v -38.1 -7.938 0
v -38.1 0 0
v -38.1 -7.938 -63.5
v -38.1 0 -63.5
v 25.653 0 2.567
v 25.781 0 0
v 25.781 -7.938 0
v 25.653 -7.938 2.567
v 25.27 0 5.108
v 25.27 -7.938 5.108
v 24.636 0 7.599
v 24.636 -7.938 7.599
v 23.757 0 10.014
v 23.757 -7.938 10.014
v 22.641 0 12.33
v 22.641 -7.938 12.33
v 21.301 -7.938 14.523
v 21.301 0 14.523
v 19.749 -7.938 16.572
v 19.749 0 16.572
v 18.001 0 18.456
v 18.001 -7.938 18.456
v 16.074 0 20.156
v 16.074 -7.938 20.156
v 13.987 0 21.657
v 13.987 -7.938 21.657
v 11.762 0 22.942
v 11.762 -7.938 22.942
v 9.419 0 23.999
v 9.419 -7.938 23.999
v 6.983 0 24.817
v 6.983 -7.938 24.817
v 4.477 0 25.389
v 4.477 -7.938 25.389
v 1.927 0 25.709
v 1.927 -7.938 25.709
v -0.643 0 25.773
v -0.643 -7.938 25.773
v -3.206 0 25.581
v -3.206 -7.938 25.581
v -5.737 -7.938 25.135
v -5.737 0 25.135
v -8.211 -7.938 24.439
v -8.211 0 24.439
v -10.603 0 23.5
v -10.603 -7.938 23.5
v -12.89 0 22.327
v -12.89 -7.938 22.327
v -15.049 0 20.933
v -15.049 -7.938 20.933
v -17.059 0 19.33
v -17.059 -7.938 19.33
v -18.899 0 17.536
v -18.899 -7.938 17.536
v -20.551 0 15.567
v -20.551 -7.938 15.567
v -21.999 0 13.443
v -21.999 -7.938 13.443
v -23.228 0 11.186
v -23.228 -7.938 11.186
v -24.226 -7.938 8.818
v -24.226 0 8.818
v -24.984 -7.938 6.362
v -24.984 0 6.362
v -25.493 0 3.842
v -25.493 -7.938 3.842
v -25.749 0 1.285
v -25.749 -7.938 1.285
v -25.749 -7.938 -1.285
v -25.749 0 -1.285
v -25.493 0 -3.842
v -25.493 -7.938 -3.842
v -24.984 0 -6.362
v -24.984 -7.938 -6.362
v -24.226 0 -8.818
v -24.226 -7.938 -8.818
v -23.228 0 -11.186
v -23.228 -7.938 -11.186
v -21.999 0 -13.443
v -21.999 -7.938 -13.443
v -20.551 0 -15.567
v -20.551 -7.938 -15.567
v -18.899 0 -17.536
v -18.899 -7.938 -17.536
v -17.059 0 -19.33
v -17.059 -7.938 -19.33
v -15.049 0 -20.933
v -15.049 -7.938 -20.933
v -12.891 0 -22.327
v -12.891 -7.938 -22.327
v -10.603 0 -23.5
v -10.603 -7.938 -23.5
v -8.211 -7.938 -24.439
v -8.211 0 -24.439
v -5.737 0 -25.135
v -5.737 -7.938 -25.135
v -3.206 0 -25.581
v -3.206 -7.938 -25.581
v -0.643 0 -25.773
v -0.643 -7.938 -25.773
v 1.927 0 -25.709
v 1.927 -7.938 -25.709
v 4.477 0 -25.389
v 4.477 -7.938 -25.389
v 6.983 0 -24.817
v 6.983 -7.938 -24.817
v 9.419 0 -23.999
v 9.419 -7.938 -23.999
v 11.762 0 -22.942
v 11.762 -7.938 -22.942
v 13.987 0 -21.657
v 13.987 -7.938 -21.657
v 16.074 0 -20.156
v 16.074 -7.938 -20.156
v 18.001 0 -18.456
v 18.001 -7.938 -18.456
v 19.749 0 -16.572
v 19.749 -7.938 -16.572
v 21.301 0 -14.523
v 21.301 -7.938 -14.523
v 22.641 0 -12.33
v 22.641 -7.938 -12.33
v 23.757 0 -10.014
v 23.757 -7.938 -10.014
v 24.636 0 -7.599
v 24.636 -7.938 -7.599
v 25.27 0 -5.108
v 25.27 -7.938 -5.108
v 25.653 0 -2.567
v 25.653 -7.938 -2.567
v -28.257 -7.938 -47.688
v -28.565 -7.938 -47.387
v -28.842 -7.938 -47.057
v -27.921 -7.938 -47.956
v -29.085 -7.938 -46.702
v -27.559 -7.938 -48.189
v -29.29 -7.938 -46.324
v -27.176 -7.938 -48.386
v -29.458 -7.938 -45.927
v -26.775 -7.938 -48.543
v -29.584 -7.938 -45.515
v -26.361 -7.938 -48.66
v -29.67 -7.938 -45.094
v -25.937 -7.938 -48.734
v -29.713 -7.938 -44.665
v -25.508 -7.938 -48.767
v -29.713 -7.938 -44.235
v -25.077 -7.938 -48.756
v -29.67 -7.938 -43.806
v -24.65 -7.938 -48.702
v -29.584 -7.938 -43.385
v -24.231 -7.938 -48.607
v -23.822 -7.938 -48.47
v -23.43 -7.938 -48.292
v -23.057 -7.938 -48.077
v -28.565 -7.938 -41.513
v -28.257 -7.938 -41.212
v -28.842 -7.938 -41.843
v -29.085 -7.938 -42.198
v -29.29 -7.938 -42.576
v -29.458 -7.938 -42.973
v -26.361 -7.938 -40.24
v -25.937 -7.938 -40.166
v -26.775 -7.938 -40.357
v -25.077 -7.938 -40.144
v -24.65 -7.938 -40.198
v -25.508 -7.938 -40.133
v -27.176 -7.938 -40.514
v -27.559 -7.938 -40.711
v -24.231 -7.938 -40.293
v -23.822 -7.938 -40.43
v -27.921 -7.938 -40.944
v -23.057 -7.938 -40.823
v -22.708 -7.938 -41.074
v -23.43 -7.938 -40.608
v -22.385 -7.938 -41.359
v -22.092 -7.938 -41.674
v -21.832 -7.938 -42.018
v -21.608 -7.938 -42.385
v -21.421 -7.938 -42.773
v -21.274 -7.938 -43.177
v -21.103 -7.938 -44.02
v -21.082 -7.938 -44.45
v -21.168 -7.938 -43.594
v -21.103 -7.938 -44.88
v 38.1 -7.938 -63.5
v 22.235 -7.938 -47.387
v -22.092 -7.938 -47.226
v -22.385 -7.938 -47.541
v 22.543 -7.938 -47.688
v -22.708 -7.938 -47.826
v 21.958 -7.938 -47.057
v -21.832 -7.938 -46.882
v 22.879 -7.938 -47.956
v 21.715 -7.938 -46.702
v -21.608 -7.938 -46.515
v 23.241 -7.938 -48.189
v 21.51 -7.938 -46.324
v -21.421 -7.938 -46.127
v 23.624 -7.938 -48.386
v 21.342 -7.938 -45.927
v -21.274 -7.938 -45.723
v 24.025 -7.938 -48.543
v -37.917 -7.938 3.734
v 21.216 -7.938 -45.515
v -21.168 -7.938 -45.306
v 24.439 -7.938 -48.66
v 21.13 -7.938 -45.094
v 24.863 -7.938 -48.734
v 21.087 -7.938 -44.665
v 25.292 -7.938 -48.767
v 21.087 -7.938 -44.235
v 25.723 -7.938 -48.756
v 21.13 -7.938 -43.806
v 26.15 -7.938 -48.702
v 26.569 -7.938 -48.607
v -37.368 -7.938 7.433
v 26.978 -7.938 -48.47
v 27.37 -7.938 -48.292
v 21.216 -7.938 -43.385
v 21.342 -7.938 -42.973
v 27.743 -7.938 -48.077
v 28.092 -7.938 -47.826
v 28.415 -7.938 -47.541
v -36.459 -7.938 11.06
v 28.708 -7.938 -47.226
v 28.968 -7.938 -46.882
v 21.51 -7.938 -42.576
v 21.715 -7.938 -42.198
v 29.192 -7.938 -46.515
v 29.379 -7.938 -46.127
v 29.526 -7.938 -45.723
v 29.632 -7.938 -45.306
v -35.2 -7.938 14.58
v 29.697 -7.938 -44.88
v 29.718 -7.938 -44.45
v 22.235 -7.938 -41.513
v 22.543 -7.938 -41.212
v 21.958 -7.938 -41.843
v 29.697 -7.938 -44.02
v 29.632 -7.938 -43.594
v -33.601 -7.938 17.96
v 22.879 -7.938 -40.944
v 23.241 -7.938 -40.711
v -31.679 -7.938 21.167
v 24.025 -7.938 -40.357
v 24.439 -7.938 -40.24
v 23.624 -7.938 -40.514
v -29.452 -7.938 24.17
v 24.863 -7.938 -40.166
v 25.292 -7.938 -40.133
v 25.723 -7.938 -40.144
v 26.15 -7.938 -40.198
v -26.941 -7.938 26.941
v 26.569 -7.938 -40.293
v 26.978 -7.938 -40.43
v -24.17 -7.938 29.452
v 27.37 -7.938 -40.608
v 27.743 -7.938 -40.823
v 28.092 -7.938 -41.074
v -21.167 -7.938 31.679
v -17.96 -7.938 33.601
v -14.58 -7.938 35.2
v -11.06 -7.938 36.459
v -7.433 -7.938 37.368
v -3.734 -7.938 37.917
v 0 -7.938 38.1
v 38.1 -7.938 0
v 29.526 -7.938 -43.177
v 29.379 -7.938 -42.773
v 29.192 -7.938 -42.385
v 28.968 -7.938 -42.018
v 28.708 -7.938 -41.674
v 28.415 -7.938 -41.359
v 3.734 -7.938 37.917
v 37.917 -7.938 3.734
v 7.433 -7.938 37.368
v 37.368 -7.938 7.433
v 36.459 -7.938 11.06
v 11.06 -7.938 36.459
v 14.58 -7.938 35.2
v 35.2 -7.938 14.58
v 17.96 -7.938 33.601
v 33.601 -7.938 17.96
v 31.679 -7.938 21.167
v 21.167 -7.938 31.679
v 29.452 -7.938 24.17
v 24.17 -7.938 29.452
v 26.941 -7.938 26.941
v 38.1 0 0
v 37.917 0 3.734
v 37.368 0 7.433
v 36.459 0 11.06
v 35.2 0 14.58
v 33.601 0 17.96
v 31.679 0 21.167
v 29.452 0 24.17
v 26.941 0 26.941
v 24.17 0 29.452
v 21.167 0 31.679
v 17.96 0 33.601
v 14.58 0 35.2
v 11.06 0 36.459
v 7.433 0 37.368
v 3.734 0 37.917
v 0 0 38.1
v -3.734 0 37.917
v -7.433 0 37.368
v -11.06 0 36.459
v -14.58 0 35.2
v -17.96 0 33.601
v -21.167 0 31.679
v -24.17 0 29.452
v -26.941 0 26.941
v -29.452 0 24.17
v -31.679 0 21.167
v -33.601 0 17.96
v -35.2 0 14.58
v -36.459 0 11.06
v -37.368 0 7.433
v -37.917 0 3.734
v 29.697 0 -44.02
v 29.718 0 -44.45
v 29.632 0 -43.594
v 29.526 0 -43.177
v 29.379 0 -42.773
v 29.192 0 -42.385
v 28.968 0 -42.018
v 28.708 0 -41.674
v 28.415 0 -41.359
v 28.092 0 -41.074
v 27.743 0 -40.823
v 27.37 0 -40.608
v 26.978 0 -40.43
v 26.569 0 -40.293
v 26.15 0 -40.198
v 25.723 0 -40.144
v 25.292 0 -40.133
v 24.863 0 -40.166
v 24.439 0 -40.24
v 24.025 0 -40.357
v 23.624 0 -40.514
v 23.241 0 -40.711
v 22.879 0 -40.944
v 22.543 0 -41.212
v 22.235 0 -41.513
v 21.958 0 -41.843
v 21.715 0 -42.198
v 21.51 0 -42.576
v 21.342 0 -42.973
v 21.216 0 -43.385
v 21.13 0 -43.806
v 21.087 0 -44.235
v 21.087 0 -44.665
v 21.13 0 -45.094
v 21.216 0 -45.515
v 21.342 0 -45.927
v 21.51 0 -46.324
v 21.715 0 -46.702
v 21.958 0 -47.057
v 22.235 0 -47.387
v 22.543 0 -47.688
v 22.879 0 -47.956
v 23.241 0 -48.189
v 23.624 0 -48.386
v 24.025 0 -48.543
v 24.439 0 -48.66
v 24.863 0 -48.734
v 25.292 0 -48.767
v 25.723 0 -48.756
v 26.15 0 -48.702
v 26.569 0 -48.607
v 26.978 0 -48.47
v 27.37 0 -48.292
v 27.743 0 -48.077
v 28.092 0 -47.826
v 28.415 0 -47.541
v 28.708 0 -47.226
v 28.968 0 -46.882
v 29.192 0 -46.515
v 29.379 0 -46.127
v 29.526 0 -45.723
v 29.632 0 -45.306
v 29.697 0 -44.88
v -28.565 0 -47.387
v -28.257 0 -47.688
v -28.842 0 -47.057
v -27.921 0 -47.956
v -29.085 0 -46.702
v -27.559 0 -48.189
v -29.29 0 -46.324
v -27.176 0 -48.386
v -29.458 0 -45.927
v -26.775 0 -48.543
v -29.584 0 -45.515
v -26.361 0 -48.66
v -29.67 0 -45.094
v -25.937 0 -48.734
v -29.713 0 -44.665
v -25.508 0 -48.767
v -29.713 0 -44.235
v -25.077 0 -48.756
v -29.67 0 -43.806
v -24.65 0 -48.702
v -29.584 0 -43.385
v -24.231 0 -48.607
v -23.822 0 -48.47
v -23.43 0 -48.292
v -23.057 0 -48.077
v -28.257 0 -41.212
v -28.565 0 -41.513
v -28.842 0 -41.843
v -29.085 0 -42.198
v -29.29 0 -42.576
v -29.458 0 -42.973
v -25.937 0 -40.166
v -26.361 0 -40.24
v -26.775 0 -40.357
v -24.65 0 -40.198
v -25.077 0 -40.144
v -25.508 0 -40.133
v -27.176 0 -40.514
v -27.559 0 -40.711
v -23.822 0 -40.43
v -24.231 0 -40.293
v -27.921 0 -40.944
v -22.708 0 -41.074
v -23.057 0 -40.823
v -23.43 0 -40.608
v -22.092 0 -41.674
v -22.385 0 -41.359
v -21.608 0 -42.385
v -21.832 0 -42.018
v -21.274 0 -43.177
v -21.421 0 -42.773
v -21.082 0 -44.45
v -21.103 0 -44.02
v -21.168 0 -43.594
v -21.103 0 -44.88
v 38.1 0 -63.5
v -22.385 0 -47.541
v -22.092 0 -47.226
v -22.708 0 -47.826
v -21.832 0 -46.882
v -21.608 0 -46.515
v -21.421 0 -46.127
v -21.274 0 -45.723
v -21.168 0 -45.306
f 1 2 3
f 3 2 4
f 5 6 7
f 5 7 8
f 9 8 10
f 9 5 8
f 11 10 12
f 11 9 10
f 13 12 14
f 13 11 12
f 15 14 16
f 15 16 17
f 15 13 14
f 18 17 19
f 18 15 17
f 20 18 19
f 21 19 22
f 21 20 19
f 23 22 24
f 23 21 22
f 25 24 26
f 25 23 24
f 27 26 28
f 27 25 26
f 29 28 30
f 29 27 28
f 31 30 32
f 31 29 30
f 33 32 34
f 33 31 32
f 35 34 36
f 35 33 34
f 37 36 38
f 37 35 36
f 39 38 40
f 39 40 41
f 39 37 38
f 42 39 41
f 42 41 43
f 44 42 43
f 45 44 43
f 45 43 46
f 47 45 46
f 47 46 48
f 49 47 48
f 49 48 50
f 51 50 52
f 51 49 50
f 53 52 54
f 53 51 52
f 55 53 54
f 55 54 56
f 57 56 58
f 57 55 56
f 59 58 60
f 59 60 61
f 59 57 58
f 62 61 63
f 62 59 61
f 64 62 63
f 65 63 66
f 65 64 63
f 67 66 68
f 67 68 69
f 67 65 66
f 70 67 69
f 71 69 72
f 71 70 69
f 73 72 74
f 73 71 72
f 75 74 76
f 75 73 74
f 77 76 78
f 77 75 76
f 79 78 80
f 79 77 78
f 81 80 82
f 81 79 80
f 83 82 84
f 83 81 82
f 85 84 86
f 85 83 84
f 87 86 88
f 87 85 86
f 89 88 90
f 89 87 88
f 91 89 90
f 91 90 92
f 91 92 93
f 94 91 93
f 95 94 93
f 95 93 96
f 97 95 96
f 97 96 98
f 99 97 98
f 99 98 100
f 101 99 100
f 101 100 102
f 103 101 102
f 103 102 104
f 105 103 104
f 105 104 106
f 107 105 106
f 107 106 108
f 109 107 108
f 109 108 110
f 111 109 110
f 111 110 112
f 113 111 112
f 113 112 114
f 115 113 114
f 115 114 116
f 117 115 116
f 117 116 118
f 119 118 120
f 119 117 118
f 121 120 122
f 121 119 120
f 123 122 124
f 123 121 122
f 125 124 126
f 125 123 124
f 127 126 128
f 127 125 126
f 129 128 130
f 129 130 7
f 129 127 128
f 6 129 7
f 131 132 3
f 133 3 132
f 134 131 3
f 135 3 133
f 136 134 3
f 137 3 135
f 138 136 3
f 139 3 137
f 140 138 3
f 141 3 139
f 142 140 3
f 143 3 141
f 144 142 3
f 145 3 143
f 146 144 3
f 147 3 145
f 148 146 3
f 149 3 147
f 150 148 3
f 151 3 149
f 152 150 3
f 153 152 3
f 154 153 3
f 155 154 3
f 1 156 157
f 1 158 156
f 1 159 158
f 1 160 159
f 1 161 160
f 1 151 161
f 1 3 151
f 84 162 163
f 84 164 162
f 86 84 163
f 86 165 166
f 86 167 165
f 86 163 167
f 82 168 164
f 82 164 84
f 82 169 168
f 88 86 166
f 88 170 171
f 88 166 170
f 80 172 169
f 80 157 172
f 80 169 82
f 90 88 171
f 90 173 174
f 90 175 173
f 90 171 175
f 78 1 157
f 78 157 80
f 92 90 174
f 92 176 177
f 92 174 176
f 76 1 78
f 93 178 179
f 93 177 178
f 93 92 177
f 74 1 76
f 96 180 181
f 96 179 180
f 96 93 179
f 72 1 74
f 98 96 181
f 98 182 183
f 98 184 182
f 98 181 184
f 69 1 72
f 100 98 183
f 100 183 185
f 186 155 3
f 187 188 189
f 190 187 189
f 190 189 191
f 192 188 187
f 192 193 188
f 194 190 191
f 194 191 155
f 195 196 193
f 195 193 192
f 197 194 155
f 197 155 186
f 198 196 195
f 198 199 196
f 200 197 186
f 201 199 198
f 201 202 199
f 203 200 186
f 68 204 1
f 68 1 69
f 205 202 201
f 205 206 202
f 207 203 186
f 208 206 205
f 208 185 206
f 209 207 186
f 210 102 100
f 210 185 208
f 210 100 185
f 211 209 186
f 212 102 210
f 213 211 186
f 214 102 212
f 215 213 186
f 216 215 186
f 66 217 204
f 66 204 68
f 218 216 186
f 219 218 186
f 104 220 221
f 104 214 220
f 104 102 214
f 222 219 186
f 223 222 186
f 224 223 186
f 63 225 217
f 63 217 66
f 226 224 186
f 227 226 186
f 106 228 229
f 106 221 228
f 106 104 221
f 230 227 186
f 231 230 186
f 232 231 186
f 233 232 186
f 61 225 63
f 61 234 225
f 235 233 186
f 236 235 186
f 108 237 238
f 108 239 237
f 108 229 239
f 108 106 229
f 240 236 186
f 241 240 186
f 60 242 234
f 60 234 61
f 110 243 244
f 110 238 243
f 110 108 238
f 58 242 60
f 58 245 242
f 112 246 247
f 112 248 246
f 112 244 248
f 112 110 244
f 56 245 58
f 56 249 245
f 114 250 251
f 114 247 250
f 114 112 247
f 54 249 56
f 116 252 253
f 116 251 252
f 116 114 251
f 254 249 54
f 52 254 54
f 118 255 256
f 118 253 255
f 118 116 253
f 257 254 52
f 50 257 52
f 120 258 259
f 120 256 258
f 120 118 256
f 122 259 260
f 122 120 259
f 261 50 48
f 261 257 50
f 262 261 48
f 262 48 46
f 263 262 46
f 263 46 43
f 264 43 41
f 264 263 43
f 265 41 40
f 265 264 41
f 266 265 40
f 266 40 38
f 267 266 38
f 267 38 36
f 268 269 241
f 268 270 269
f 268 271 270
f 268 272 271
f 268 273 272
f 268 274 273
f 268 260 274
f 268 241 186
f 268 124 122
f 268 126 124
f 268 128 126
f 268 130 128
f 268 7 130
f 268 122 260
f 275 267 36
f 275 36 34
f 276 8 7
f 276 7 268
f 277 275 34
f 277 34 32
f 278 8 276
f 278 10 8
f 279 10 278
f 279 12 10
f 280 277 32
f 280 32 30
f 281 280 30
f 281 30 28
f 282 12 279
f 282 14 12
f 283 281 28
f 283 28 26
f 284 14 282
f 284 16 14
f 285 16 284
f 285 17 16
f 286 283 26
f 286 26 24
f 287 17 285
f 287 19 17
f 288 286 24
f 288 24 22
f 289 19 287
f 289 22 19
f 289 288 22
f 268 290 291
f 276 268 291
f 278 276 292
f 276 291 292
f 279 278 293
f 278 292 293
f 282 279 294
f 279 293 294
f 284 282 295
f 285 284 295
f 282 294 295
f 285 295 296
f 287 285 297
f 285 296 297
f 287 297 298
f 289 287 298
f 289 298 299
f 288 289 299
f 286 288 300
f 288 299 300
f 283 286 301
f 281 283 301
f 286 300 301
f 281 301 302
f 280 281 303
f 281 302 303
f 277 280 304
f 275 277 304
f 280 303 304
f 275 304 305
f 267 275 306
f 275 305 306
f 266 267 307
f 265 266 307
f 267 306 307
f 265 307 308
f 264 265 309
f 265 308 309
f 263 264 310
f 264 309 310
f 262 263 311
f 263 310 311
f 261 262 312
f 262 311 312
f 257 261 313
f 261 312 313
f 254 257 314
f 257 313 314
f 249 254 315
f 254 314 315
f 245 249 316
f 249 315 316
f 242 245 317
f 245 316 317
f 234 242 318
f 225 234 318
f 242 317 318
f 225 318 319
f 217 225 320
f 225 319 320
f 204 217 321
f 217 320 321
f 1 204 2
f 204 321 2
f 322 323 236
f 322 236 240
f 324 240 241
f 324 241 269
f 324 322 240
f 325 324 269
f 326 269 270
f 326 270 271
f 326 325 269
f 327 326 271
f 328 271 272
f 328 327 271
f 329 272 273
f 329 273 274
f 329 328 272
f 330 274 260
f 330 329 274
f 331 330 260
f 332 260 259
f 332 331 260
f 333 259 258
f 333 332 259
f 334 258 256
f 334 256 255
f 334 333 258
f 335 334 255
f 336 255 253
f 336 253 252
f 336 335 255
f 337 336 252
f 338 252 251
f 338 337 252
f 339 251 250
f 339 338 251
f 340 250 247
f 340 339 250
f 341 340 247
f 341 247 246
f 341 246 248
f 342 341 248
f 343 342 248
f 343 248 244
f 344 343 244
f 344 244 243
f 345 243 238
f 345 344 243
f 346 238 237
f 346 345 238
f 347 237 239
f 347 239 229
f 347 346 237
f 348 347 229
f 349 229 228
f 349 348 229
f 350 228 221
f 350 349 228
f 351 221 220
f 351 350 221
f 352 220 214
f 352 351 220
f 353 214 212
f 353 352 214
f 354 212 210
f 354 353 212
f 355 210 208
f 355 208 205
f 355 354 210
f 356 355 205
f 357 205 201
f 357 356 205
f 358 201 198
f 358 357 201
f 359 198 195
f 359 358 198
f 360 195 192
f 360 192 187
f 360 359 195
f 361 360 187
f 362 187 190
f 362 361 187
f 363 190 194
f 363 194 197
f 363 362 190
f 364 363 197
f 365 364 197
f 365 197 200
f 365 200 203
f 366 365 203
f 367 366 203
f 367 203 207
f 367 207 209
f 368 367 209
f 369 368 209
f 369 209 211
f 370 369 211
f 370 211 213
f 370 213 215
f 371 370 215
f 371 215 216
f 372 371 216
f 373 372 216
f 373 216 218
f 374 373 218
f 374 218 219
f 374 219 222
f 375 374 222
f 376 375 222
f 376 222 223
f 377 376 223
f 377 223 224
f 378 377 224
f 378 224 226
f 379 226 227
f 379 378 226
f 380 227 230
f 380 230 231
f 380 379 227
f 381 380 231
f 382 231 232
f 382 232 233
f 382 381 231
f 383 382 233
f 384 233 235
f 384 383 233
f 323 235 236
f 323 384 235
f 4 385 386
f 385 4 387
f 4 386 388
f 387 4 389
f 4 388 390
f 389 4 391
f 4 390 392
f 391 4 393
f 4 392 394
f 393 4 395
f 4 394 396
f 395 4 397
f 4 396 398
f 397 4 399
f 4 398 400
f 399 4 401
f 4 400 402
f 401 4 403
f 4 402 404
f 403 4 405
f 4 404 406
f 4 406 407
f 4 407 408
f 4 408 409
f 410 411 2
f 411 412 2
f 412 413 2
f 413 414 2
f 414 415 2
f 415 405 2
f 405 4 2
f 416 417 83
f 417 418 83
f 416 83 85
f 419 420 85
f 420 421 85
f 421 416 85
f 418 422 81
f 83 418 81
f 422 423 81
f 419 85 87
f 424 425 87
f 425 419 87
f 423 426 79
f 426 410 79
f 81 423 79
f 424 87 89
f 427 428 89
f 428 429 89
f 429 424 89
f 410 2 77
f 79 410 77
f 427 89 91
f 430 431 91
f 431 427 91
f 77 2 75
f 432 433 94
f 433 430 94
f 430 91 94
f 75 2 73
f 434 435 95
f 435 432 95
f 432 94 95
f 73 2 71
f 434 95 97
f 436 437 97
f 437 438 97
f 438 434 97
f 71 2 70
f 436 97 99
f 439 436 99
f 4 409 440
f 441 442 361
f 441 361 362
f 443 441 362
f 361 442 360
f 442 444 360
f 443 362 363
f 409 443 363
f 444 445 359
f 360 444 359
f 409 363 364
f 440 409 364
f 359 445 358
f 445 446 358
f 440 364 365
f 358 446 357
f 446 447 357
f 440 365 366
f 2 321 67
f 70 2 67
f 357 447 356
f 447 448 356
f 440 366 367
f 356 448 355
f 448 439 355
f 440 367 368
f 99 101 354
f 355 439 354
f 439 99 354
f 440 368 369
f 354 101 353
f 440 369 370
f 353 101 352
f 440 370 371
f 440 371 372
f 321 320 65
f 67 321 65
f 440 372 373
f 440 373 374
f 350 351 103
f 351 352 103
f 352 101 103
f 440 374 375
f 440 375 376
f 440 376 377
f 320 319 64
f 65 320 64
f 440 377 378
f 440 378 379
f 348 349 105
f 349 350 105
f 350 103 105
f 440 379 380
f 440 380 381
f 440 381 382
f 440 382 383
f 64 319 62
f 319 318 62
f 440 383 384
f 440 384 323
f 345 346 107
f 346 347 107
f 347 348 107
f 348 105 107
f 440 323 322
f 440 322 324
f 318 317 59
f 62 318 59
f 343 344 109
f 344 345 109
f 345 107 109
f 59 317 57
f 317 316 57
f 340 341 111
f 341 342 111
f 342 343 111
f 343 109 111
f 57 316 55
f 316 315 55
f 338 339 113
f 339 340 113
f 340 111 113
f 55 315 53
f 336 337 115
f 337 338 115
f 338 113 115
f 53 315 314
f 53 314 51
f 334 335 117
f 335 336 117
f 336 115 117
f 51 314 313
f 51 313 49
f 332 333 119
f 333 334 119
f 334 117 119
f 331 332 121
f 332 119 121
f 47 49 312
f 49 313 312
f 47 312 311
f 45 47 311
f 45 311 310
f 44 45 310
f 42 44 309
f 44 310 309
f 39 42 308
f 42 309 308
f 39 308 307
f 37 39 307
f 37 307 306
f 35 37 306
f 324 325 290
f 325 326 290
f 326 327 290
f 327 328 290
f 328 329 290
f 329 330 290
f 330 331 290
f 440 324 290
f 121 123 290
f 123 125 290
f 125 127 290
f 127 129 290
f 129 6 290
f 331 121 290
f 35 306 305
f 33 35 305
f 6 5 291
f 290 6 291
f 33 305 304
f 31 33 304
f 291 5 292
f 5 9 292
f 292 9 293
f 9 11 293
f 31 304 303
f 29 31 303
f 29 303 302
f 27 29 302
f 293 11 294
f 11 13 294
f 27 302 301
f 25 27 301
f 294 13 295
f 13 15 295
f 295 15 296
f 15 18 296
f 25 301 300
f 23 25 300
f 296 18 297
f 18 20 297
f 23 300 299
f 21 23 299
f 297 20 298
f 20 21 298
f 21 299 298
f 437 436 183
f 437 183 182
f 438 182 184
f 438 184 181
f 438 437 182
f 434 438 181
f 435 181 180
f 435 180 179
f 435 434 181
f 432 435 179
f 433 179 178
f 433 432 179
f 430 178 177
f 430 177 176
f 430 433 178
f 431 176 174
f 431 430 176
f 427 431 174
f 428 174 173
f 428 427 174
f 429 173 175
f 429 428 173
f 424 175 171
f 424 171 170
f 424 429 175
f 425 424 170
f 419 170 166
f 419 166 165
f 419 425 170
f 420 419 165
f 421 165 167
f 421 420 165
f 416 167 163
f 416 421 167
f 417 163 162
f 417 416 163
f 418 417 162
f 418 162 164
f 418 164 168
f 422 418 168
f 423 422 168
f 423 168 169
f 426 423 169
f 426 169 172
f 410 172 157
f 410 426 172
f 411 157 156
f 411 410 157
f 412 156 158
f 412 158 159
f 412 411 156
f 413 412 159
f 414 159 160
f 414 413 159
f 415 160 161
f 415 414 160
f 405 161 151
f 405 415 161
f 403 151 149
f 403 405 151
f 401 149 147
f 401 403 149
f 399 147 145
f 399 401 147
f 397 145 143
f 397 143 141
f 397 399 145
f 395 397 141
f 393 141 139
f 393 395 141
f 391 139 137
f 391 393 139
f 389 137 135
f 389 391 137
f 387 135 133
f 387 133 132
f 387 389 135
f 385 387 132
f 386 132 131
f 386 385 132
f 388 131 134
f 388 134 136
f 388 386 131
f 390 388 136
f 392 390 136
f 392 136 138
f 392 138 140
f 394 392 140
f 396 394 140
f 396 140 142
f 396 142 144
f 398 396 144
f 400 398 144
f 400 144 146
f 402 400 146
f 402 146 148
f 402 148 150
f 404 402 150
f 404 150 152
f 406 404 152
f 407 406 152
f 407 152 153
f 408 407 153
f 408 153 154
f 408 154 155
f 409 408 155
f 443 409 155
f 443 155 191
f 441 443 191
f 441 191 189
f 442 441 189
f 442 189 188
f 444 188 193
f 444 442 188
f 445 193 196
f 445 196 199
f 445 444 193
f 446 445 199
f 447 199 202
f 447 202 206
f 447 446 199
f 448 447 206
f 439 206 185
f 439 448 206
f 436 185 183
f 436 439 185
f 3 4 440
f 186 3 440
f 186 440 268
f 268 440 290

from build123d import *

# Parameters (mm, degrees)
F0_R     = 4.318
F0_R_2   = 25.781
F1_DEPTH = 7.9375


with BuildPart() as f1:
    # F0 (on Front) → F1 (new body)
    with BuildSketch(Plane.XZ):
        with BuildLine():
            Line((38.1, -63.5), (38.1, 0))
            ThreePointArc((38.1, 0), (0, 38.1), (-38.1, 0))
            Line((-38.1, 0), (-38.1, -63.5))
            Line((-38.1, -63.5), (38.1, -63.5))
        make_face()
        with Locations((-25.4, -44.45)):
            Circle(F0_R, mode=Mode.SUBTRACT)
        with Locations((25.4, -44.45)):
            Circle(F0_R, mode=Mode.SUBTRACT)
        Circle(F0_R_2, mode=Mode.SUBTRACT)
    extrude(amount=F1_DEPTH)


solid = f1.part
